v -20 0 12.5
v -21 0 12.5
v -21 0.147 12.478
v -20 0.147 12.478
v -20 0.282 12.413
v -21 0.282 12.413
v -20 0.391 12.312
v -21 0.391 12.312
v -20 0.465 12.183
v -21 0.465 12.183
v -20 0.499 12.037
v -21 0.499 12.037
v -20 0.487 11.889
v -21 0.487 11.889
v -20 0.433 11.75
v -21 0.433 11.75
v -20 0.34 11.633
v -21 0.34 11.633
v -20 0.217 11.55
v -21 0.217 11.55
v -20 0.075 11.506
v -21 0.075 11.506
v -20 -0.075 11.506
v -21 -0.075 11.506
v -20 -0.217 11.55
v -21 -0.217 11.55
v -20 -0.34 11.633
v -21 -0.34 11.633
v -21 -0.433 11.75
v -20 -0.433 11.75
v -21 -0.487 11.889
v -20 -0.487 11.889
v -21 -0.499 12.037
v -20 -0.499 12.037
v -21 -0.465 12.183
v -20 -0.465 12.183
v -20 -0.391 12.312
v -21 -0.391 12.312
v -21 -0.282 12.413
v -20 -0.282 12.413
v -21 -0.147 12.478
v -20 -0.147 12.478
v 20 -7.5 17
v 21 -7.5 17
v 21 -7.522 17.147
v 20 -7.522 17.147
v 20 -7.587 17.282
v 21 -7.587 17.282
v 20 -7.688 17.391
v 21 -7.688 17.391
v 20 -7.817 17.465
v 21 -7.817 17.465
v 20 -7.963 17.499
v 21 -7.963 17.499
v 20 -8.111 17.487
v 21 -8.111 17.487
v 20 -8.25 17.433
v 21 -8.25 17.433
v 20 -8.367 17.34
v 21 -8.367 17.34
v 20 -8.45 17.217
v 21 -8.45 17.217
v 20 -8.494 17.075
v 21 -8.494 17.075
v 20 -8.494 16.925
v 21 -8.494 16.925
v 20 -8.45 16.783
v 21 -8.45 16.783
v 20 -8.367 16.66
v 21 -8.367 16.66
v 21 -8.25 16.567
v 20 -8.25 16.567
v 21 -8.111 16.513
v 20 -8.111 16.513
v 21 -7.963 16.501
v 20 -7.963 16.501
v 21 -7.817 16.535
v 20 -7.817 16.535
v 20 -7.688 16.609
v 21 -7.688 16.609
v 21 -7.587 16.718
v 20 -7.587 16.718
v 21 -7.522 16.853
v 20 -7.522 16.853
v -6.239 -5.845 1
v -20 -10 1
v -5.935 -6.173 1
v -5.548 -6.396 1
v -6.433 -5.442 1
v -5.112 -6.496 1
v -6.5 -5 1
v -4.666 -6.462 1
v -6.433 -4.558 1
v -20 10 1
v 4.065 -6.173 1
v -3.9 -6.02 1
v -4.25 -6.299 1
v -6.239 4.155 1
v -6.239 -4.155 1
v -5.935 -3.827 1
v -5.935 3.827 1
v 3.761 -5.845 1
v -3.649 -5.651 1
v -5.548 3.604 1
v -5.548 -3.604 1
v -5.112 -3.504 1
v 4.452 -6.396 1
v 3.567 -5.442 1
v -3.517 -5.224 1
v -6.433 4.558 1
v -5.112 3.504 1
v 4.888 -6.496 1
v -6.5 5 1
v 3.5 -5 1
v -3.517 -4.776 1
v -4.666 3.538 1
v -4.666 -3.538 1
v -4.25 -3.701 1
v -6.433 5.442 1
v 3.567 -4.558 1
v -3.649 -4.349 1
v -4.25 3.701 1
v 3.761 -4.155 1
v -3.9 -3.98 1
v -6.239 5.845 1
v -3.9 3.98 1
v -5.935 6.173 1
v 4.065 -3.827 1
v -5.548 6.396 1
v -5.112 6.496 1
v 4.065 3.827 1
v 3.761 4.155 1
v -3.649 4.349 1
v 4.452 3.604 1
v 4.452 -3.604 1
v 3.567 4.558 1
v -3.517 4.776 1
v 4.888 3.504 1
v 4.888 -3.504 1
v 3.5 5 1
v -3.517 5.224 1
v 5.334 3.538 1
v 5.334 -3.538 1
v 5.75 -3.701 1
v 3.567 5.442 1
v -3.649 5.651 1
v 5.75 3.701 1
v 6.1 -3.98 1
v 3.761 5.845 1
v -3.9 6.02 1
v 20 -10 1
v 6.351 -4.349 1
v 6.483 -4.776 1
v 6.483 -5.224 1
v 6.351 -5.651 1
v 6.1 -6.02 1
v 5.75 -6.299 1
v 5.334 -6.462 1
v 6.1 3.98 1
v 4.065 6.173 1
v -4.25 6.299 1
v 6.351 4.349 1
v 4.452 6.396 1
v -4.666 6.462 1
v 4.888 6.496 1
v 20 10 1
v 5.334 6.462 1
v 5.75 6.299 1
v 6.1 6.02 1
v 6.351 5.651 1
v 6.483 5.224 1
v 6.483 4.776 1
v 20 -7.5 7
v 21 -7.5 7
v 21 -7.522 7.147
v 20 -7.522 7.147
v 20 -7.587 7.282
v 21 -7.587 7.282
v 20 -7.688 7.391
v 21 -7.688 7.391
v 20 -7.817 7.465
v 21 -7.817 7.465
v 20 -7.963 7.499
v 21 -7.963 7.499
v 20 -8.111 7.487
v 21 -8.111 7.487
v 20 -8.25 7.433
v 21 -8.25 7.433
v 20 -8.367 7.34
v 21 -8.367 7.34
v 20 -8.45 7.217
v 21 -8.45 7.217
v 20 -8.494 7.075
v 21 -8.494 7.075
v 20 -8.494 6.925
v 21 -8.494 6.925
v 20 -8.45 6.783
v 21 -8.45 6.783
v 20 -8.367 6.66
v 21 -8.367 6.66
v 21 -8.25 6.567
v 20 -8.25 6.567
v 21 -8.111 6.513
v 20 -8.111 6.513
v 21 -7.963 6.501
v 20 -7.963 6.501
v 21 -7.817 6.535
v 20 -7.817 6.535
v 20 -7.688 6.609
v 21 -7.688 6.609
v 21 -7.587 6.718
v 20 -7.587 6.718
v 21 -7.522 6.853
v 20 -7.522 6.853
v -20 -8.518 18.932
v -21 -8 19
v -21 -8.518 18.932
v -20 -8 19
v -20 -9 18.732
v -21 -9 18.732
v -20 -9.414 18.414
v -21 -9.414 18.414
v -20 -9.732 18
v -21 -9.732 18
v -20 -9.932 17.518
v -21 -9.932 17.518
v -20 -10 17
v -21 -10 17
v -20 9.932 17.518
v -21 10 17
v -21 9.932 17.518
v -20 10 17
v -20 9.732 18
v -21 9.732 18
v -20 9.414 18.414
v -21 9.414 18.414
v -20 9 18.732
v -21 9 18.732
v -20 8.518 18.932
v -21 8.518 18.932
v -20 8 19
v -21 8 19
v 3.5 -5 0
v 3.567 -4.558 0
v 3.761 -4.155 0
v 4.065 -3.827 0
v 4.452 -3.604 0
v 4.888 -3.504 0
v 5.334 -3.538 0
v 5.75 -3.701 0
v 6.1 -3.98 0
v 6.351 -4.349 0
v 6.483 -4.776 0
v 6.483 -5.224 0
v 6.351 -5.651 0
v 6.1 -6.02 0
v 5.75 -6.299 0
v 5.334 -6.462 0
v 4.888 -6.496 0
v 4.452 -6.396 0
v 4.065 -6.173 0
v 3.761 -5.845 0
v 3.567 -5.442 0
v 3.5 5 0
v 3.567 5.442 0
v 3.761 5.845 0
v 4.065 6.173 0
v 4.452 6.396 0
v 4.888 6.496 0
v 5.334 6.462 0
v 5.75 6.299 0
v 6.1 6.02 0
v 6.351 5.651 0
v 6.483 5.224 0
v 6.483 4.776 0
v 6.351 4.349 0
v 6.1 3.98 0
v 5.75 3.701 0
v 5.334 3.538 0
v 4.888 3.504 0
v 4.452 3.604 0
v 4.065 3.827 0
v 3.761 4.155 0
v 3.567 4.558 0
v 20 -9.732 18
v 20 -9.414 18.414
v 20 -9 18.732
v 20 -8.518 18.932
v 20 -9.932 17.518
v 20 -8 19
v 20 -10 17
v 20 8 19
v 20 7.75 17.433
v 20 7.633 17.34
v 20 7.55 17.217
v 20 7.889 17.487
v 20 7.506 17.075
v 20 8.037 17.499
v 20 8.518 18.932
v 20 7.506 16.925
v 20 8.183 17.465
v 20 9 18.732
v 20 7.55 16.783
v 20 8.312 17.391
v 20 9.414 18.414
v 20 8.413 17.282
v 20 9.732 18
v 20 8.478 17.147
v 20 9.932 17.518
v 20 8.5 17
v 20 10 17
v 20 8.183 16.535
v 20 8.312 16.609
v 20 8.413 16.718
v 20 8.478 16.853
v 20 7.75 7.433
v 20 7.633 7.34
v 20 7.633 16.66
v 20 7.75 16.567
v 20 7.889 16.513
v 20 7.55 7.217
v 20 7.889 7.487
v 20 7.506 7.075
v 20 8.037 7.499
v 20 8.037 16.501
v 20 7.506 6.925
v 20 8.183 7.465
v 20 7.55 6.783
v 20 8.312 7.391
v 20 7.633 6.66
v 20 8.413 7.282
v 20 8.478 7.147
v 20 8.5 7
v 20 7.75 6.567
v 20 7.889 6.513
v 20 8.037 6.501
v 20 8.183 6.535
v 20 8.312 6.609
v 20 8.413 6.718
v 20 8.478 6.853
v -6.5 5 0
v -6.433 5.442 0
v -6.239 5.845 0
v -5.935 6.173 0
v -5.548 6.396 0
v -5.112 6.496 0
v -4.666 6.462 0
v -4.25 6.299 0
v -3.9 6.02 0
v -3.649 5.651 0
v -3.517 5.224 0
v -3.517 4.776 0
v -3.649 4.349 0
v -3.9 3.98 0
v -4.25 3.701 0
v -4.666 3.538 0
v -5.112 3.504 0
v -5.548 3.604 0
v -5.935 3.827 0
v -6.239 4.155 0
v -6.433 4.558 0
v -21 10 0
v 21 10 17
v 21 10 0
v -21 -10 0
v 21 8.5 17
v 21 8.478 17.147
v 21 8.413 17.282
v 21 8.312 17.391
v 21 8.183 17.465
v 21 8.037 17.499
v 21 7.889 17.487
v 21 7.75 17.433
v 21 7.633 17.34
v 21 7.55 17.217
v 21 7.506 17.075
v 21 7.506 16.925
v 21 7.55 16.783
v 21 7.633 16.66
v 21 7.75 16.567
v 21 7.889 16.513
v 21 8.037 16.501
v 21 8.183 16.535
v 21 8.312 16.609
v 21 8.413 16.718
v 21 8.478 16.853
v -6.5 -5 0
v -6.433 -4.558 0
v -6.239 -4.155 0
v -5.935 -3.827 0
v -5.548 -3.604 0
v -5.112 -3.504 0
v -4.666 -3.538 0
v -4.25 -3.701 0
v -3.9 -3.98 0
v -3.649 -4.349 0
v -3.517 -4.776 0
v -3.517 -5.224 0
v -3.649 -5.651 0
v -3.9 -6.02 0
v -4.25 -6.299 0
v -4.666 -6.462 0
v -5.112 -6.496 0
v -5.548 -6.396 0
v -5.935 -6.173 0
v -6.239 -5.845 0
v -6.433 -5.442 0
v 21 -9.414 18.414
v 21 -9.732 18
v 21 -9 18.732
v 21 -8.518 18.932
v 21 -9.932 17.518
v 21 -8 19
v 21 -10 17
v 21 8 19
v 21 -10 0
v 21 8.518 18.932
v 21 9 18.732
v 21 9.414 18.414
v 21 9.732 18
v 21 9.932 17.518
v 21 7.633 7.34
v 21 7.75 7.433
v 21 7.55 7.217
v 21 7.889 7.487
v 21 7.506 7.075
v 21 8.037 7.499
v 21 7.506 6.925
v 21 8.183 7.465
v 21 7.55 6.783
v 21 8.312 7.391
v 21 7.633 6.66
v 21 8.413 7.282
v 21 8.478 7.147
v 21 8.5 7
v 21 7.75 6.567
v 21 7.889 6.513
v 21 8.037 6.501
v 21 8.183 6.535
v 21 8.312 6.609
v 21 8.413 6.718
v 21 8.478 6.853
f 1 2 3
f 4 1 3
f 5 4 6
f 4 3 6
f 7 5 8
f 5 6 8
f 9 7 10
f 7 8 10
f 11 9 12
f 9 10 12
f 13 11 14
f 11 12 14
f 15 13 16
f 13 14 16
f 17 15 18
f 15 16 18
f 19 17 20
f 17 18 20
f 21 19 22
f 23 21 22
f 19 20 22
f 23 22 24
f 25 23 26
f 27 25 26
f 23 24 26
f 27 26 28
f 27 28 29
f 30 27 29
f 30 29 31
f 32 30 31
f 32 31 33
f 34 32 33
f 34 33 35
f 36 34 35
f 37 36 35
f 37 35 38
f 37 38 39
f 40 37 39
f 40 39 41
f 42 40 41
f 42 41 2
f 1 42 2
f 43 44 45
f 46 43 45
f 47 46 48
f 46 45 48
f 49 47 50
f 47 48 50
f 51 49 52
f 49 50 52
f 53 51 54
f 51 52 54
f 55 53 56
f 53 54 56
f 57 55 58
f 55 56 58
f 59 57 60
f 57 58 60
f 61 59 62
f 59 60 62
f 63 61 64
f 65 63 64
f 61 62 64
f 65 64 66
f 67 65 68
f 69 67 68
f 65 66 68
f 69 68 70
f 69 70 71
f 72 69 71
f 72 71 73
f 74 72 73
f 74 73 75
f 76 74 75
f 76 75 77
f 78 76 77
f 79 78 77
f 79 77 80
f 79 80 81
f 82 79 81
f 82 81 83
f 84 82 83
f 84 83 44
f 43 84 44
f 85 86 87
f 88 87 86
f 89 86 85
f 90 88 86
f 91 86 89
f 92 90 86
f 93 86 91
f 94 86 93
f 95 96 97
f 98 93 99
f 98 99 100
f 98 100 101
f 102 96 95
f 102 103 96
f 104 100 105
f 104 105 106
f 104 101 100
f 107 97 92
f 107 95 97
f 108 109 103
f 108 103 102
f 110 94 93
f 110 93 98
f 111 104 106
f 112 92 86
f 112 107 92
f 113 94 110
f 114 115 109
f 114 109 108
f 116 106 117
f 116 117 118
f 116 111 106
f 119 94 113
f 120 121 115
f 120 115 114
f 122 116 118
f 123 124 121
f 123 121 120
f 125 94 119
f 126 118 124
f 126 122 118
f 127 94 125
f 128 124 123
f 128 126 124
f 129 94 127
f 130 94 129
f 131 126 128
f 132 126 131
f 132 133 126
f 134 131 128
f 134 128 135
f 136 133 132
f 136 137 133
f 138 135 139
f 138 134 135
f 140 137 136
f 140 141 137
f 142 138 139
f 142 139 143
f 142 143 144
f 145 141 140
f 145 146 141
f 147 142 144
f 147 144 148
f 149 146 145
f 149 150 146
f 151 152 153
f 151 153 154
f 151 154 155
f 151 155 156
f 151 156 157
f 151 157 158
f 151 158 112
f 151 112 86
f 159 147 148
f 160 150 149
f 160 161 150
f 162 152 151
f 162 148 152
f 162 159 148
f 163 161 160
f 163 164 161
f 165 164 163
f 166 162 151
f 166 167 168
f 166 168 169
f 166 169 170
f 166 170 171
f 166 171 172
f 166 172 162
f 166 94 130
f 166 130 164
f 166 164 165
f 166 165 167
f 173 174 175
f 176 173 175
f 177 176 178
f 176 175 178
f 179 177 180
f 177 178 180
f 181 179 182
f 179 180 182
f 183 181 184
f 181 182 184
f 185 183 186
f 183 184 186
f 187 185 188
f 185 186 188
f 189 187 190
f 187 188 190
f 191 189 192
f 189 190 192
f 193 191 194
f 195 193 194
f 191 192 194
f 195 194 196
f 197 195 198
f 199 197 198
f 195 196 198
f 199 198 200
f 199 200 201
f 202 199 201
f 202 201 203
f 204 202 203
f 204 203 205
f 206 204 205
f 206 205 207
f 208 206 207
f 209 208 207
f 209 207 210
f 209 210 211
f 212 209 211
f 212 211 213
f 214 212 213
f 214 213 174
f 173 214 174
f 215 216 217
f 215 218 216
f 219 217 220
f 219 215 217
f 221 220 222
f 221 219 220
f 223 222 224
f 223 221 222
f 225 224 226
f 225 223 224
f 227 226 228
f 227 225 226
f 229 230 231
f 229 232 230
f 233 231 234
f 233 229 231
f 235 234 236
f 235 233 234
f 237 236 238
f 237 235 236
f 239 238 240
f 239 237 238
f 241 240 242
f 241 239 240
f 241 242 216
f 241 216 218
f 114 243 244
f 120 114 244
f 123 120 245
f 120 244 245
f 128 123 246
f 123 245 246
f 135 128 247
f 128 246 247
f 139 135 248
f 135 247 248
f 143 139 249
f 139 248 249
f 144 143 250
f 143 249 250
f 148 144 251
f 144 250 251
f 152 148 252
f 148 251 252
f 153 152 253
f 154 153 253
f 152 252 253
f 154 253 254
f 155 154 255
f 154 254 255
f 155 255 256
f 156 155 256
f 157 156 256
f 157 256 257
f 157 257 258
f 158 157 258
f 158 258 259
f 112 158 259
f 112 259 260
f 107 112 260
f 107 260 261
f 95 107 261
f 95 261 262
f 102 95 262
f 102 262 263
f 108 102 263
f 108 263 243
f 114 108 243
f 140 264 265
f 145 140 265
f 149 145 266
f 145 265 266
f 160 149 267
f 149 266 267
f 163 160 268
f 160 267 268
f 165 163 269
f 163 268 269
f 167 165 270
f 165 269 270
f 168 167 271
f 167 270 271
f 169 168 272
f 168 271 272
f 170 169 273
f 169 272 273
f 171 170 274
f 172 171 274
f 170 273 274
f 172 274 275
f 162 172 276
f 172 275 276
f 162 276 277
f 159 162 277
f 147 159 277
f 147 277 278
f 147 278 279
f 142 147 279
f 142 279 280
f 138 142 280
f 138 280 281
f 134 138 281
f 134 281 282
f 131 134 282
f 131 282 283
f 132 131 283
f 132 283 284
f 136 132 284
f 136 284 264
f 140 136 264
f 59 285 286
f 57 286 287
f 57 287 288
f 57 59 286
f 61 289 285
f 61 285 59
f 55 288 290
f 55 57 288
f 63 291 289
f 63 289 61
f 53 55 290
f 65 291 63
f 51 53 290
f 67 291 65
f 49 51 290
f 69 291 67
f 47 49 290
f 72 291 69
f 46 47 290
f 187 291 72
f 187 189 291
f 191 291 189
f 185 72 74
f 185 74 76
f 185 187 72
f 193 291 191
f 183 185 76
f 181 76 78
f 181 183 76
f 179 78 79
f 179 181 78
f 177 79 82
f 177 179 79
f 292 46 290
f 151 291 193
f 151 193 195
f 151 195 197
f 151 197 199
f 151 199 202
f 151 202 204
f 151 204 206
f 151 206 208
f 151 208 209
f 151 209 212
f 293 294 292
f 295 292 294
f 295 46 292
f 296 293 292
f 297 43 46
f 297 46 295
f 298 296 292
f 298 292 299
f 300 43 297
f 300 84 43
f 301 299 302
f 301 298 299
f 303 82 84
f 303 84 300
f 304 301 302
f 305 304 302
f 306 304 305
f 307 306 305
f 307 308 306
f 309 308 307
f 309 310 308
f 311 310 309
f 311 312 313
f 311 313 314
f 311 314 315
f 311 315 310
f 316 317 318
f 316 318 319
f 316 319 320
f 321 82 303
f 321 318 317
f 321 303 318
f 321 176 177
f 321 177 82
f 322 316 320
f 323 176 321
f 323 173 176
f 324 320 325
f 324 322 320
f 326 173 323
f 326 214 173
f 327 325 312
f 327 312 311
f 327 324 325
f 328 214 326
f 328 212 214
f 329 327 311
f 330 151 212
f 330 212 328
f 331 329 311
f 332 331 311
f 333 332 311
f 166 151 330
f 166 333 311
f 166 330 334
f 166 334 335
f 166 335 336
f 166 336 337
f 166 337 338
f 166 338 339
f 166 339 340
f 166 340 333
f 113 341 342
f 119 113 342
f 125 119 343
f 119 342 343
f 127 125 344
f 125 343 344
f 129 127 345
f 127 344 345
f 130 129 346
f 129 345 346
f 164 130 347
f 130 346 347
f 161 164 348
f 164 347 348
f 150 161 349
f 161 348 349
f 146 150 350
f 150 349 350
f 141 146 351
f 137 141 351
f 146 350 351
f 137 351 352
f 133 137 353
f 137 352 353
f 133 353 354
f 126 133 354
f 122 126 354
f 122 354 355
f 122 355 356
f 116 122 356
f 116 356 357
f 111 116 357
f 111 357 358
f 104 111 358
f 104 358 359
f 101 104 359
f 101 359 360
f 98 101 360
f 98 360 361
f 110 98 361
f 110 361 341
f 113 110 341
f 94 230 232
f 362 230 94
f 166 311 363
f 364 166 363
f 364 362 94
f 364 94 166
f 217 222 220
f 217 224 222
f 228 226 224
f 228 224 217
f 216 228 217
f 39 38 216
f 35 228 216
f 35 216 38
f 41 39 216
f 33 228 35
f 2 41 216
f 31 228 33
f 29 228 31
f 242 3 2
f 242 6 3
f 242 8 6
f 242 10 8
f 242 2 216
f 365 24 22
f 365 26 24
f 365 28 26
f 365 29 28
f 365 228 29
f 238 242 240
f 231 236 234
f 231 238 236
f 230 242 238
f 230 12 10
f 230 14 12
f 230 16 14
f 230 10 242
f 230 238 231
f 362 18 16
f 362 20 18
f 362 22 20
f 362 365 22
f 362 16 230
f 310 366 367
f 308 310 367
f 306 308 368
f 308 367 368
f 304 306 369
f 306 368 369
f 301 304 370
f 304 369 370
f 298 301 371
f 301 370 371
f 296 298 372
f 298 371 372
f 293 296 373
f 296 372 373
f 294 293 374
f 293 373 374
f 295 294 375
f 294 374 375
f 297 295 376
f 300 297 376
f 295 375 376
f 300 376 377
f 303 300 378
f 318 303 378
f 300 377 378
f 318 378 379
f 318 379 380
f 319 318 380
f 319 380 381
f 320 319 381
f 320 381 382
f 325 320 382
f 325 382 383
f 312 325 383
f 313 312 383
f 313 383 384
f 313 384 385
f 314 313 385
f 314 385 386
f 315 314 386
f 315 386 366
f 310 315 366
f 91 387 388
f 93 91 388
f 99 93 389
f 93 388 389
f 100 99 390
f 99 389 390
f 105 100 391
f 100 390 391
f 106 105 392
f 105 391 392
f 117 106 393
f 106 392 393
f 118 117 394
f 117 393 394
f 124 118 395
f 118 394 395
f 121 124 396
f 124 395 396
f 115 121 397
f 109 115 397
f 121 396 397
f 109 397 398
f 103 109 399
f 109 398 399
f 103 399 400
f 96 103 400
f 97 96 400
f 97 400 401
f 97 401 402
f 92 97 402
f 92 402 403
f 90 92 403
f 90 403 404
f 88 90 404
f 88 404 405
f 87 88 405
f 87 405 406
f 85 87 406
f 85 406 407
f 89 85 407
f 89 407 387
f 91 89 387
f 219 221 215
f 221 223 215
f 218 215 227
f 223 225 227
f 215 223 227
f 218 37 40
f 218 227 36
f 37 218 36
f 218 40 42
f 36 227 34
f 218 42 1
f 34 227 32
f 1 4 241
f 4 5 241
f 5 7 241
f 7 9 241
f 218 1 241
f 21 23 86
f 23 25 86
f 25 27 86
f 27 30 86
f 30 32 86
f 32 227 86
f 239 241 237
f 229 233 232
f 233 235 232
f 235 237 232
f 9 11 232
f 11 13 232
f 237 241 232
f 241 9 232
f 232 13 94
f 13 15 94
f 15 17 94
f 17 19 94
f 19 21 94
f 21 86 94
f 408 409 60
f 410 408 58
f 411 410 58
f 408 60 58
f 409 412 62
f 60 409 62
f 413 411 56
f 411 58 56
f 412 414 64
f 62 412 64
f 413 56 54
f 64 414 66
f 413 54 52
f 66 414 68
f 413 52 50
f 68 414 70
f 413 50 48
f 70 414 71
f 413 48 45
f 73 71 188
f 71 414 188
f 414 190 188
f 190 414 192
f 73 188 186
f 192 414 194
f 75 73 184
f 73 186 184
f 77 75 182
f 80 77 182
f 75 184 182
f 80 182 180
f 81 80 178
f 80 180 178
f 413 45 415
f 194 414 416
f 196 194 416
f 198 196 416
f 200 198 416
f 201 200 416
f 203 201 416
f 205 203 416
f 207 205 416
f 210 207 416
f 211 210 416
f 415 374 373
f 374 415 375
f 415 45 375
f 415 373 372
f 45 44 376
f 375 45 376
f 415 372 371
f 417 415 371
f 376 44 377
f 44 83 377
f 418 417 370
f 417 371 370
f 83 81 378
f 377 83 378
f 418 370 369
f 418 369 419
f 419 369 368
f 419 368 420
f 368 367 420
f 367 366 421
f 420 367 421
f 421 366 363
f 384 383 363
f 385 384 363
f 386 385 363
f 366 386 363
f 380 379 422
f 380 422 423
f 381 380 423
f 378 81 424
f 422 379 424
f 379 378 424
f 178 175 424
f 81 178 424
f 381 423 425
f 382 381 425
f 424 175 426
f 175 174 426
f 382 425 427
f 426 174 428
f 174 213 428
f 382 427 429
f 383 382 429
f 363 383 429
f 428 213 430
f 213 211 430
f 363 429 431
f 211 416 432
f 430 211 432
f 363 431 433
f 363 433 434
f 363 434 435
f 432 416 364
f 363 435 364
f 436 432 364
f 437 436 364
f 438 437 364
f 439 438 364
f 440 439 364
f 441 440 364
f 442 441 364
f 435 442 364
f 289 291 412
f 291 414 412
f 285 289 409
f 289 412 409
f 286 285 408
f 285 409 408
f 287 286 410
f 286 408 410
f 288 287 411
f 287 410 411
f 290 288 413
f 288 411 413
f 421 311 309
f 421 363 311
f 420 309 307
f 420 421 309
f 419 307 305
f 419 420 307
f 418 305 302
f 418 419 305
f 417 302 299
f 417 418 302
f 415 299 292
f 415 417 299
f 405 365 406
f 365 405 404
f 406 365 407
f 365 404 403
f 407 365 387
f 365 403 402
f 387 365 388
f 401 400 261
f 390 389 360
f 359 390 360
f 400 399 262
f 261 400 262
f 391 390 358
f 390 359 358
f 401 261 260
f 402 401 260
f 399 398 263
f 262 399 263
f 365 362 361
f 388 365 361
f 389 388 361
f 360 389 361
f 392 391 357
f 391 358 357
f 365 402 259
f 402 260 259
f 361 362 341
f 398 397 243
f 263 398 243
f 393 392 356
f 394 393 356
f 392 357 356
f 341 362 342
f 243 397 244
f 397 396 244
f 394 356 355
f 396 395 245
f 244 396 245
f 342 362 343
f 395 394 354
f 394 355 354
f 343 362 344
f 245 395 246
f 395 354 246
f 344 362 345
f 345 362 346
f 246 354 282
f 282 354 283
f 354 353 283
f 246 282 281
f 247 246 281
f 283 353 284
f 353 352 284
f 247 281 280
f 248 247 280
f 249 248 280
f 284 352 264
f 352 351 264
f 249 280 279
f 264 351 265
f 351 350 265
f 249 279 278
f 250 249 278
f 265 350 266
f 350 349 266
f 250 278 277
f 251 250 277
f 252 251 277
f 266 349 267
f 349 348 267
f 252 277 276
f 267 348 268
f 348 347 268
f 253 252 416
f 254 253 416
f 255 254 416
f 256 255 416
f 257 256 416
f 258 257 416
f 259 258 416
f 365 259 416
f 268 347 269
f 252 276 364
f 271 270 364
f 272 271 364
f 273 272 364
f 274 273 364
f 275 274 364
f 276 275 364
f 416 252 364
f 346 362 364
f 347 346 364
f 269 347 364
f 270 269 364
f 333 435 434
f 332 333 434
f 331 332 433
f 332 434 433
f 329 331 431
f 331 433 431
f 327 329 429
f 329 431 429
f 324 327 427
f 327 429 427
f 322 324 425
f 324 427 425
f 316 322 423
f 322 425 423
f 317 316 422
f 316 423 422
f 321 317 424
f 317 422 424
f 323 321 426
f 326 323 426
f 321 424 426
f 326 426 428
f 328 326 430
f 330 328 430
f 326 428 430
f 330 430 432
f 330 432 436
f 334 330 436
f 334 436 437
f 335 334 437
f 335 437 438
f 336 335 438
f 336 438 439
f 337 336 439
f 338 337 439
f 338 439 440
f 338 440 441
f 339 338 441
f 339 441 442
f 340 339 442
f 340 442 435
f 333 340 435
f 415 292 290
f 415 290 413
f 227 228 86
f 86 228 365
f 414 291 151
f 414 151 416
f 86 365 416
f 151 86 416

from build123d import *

# Parameters (mm, degrees)
SKETCH_1_W          = 42
SKETCH_1_H          = 20
EXTRUDE_1_DEPTH     = 1
SKETCH_2_W          = 1
SKETCH_2_H          = 20
EXTRUDE_2_DEPTH     = 18
CUT_EXTRUDE_1_REACH = 49.17
SKETCH_3_R          = 0.5
FILLET_1_R          = 2
FILLET_2_R          = 2
FILLET_4_R          = 2
CUT_EXTRUDE_2_REACH = 49.17
SKETCH_6_R          = 0.5
SKETCH_7_R          = 1.5
CUT_EXTRUDE_3_DEPTH = 10


with BuildPart() as part:
    # 草图1 → 凸台-拉伸1 (new body)
    with BuildSketch(Plane.XY):
        Rectangle(SKETCH_1_W, SKETCH_1_H)
    extrude(amount=EXTRUDE_1_DEPTH)

    # 草图2 → 凸台-拉伸2 (add)
    with BuildSketch(Plane.XY.offset(1)):
        with Locations((-20.5, 0)):
            Rectangle(SKETCH_2_W, SKETCH_2_H)
        with Locations((20.5, 0)):
            Rectangle(SKETCH_2_W, SKETCH_2_H)
    extrude(amount=EXTRUDE_2_DEPTH)

    # 草图3 → 切除-拉伸1 (cut, up to next)
    with BuildSketch(Plane(origin=(21, 0, 0), x_dir=(0, 0, -1), z_dir=(1, 0, 0)), mode=Mode.PRIVATE) as cut_extrude_1_sk1:
        with Locations(Location((-17, 8, 0), (0, 0, 90))):
            Circle(SKETCH_3_R)
    cut_extrude_1_tool1 = extrude(cut_extrude_1_sk1.sketch, amount=-CUT_EXTRUDE_1_REACH, mode=Mode.PRIVATE) & part.part
    # 草图3 → 切除-拉伸1 (cut, up to next)
    with BuildSketch(Plane(origin=(21, 0, 0), x_dir=(0, 0, -1), z_dir=(1, 0, 0)), mode=Mode.PRIVATE) as cut_extrude_1_sk2:
        with Locations(Location((-7, 8, 0), (0, 0, 90))):
            Circle(SKETCH_3_R)
    cut_extrude_1_tool2 = extrude(cut_extrude_1_sk2.sketch, amount=-CUT_EXTRUDE_1_REACH, mode=Mode.PRIVATE) & part.part
    # 草图3 → 切除-拉伸1 (cut, up to next)
    with BuildSketch(Plane(origin=(21, 0, 0), x_dir=(0, 0, -1), z_dir=(1, 0, 0)), mode=Mode.PRIVATE) as cut_extrude_1_sk3:
        with Locations(Location((-7, -8, 0), (0, 0, 90))):
            Circle(SKETCH_3_R)
    cut_extrude_1_tool3 = extrude(cut_extrude_1_sk3.sketch, amount=-CUT_EXTRUDE_1_REACH, mode=Mode.PRIVATE) & part.part
    # 草图3 → 切除-拉伸1 (cut, up to next)
    with BuildSketch(Plane(origin=(21, 0, 0), x_dir=(0, 0, -1), z_dir=(1, 0, 0)), mode=Mode.PRIVATE) as cut_extrude_1_sk4:
        with Locations(Location((-17, -8, 0), (0, 0, 90))):
            Circle(SKETCH_3_R)
    cut_extrude_1_tool4 = extrude(cut_extrude_1_sk4.sketch, amount=-CUT_EXTRUDE_1_REACH, mode=Mode.PRIVATE) & part.part
    add(cut_extrude_1_tool1.solids().sort_by_distance((21, 8, 17))[0], mode=Mode.SUBTRACT)
    add(cut_extrude_1_tool2.solids().sort_by_distance((21, 8, 7))[0], mode=Mode.SUBTRACT)
    add(cut_extrude_1_tool3.solids().sort_by_distance((21, -8, 7))[0], mode=Mode.SUBTRACT)
    add(cut_extrude_1_tool4.solids().sort_by_distance((21, -8, 17))[0], mode=Mode.SUBTRACT)

    # 圆角1
    fillet_1_edges = [part.edges().sort_by_distance(p)[0] for p in [
        (20.5, 10, 19),
        (20.5, -10, 19),
    ]]
    fillet(fillet_1_edges, radius=FILLET_1_R)

    # 圆角2
    fillet_2_edges = [part.edges().sort_by_distance(p)[0] for p in [
        (-20.5, 10, 19),
    ]]
    fillet(fillet_2_edges, radius=FILLET_2_R)

    # 圆角4
    fillet_4_edges = [part.edges().sort_by_distance(p)[0] for p in [
        (-20.5, -10, 19),
    ]]
    fillet(fillet_4_edges, radius=FILLET_4_R)

    # 草图6 → 切除-拉伸2 (cut, up to next)
    with BuildSketch(Plane.ZY.offset(21), mode=Mode.PRIVATE) as cut_extrude_2_sk1:
        with Locations((12, 0)):
            Circle(SKETCH_6_R)
    cut_extrude_2_tool1 = extrude(cut_extrude_2_sk1.sketch, amount=-CUT_EXTRUDE_2_REACH, mode=Mode.PRIVATE) & part.part
    add(cut_extrude_2_tool1.solids().sort_by_distance((-21, 0, 12))[0], mode=Mode.SUBTRACT)

    # 草图7 → 切除-拉伸3 (cut)
    with BuildSketch(Plane(origin=(0, 0, 0), x_dir=(-1, 0, 0), z_dir=(0, 0, -1))):
        with Locations((5, -5)):
            Circle(SKETCH_7_R)
        with Locations((-5, -5)):
            Circle(SKETCH_7_R)
        with Locations((-5, 5)):
            Circle(SKETCH_7_R)
        with Locations((5, 5)):
            Circle(SKETCH_7_R)
    extrude(amount=-CUT_EXTRUDE_3_DEPTH, mode=Mode.SUBTRACT)


solid = part.part
